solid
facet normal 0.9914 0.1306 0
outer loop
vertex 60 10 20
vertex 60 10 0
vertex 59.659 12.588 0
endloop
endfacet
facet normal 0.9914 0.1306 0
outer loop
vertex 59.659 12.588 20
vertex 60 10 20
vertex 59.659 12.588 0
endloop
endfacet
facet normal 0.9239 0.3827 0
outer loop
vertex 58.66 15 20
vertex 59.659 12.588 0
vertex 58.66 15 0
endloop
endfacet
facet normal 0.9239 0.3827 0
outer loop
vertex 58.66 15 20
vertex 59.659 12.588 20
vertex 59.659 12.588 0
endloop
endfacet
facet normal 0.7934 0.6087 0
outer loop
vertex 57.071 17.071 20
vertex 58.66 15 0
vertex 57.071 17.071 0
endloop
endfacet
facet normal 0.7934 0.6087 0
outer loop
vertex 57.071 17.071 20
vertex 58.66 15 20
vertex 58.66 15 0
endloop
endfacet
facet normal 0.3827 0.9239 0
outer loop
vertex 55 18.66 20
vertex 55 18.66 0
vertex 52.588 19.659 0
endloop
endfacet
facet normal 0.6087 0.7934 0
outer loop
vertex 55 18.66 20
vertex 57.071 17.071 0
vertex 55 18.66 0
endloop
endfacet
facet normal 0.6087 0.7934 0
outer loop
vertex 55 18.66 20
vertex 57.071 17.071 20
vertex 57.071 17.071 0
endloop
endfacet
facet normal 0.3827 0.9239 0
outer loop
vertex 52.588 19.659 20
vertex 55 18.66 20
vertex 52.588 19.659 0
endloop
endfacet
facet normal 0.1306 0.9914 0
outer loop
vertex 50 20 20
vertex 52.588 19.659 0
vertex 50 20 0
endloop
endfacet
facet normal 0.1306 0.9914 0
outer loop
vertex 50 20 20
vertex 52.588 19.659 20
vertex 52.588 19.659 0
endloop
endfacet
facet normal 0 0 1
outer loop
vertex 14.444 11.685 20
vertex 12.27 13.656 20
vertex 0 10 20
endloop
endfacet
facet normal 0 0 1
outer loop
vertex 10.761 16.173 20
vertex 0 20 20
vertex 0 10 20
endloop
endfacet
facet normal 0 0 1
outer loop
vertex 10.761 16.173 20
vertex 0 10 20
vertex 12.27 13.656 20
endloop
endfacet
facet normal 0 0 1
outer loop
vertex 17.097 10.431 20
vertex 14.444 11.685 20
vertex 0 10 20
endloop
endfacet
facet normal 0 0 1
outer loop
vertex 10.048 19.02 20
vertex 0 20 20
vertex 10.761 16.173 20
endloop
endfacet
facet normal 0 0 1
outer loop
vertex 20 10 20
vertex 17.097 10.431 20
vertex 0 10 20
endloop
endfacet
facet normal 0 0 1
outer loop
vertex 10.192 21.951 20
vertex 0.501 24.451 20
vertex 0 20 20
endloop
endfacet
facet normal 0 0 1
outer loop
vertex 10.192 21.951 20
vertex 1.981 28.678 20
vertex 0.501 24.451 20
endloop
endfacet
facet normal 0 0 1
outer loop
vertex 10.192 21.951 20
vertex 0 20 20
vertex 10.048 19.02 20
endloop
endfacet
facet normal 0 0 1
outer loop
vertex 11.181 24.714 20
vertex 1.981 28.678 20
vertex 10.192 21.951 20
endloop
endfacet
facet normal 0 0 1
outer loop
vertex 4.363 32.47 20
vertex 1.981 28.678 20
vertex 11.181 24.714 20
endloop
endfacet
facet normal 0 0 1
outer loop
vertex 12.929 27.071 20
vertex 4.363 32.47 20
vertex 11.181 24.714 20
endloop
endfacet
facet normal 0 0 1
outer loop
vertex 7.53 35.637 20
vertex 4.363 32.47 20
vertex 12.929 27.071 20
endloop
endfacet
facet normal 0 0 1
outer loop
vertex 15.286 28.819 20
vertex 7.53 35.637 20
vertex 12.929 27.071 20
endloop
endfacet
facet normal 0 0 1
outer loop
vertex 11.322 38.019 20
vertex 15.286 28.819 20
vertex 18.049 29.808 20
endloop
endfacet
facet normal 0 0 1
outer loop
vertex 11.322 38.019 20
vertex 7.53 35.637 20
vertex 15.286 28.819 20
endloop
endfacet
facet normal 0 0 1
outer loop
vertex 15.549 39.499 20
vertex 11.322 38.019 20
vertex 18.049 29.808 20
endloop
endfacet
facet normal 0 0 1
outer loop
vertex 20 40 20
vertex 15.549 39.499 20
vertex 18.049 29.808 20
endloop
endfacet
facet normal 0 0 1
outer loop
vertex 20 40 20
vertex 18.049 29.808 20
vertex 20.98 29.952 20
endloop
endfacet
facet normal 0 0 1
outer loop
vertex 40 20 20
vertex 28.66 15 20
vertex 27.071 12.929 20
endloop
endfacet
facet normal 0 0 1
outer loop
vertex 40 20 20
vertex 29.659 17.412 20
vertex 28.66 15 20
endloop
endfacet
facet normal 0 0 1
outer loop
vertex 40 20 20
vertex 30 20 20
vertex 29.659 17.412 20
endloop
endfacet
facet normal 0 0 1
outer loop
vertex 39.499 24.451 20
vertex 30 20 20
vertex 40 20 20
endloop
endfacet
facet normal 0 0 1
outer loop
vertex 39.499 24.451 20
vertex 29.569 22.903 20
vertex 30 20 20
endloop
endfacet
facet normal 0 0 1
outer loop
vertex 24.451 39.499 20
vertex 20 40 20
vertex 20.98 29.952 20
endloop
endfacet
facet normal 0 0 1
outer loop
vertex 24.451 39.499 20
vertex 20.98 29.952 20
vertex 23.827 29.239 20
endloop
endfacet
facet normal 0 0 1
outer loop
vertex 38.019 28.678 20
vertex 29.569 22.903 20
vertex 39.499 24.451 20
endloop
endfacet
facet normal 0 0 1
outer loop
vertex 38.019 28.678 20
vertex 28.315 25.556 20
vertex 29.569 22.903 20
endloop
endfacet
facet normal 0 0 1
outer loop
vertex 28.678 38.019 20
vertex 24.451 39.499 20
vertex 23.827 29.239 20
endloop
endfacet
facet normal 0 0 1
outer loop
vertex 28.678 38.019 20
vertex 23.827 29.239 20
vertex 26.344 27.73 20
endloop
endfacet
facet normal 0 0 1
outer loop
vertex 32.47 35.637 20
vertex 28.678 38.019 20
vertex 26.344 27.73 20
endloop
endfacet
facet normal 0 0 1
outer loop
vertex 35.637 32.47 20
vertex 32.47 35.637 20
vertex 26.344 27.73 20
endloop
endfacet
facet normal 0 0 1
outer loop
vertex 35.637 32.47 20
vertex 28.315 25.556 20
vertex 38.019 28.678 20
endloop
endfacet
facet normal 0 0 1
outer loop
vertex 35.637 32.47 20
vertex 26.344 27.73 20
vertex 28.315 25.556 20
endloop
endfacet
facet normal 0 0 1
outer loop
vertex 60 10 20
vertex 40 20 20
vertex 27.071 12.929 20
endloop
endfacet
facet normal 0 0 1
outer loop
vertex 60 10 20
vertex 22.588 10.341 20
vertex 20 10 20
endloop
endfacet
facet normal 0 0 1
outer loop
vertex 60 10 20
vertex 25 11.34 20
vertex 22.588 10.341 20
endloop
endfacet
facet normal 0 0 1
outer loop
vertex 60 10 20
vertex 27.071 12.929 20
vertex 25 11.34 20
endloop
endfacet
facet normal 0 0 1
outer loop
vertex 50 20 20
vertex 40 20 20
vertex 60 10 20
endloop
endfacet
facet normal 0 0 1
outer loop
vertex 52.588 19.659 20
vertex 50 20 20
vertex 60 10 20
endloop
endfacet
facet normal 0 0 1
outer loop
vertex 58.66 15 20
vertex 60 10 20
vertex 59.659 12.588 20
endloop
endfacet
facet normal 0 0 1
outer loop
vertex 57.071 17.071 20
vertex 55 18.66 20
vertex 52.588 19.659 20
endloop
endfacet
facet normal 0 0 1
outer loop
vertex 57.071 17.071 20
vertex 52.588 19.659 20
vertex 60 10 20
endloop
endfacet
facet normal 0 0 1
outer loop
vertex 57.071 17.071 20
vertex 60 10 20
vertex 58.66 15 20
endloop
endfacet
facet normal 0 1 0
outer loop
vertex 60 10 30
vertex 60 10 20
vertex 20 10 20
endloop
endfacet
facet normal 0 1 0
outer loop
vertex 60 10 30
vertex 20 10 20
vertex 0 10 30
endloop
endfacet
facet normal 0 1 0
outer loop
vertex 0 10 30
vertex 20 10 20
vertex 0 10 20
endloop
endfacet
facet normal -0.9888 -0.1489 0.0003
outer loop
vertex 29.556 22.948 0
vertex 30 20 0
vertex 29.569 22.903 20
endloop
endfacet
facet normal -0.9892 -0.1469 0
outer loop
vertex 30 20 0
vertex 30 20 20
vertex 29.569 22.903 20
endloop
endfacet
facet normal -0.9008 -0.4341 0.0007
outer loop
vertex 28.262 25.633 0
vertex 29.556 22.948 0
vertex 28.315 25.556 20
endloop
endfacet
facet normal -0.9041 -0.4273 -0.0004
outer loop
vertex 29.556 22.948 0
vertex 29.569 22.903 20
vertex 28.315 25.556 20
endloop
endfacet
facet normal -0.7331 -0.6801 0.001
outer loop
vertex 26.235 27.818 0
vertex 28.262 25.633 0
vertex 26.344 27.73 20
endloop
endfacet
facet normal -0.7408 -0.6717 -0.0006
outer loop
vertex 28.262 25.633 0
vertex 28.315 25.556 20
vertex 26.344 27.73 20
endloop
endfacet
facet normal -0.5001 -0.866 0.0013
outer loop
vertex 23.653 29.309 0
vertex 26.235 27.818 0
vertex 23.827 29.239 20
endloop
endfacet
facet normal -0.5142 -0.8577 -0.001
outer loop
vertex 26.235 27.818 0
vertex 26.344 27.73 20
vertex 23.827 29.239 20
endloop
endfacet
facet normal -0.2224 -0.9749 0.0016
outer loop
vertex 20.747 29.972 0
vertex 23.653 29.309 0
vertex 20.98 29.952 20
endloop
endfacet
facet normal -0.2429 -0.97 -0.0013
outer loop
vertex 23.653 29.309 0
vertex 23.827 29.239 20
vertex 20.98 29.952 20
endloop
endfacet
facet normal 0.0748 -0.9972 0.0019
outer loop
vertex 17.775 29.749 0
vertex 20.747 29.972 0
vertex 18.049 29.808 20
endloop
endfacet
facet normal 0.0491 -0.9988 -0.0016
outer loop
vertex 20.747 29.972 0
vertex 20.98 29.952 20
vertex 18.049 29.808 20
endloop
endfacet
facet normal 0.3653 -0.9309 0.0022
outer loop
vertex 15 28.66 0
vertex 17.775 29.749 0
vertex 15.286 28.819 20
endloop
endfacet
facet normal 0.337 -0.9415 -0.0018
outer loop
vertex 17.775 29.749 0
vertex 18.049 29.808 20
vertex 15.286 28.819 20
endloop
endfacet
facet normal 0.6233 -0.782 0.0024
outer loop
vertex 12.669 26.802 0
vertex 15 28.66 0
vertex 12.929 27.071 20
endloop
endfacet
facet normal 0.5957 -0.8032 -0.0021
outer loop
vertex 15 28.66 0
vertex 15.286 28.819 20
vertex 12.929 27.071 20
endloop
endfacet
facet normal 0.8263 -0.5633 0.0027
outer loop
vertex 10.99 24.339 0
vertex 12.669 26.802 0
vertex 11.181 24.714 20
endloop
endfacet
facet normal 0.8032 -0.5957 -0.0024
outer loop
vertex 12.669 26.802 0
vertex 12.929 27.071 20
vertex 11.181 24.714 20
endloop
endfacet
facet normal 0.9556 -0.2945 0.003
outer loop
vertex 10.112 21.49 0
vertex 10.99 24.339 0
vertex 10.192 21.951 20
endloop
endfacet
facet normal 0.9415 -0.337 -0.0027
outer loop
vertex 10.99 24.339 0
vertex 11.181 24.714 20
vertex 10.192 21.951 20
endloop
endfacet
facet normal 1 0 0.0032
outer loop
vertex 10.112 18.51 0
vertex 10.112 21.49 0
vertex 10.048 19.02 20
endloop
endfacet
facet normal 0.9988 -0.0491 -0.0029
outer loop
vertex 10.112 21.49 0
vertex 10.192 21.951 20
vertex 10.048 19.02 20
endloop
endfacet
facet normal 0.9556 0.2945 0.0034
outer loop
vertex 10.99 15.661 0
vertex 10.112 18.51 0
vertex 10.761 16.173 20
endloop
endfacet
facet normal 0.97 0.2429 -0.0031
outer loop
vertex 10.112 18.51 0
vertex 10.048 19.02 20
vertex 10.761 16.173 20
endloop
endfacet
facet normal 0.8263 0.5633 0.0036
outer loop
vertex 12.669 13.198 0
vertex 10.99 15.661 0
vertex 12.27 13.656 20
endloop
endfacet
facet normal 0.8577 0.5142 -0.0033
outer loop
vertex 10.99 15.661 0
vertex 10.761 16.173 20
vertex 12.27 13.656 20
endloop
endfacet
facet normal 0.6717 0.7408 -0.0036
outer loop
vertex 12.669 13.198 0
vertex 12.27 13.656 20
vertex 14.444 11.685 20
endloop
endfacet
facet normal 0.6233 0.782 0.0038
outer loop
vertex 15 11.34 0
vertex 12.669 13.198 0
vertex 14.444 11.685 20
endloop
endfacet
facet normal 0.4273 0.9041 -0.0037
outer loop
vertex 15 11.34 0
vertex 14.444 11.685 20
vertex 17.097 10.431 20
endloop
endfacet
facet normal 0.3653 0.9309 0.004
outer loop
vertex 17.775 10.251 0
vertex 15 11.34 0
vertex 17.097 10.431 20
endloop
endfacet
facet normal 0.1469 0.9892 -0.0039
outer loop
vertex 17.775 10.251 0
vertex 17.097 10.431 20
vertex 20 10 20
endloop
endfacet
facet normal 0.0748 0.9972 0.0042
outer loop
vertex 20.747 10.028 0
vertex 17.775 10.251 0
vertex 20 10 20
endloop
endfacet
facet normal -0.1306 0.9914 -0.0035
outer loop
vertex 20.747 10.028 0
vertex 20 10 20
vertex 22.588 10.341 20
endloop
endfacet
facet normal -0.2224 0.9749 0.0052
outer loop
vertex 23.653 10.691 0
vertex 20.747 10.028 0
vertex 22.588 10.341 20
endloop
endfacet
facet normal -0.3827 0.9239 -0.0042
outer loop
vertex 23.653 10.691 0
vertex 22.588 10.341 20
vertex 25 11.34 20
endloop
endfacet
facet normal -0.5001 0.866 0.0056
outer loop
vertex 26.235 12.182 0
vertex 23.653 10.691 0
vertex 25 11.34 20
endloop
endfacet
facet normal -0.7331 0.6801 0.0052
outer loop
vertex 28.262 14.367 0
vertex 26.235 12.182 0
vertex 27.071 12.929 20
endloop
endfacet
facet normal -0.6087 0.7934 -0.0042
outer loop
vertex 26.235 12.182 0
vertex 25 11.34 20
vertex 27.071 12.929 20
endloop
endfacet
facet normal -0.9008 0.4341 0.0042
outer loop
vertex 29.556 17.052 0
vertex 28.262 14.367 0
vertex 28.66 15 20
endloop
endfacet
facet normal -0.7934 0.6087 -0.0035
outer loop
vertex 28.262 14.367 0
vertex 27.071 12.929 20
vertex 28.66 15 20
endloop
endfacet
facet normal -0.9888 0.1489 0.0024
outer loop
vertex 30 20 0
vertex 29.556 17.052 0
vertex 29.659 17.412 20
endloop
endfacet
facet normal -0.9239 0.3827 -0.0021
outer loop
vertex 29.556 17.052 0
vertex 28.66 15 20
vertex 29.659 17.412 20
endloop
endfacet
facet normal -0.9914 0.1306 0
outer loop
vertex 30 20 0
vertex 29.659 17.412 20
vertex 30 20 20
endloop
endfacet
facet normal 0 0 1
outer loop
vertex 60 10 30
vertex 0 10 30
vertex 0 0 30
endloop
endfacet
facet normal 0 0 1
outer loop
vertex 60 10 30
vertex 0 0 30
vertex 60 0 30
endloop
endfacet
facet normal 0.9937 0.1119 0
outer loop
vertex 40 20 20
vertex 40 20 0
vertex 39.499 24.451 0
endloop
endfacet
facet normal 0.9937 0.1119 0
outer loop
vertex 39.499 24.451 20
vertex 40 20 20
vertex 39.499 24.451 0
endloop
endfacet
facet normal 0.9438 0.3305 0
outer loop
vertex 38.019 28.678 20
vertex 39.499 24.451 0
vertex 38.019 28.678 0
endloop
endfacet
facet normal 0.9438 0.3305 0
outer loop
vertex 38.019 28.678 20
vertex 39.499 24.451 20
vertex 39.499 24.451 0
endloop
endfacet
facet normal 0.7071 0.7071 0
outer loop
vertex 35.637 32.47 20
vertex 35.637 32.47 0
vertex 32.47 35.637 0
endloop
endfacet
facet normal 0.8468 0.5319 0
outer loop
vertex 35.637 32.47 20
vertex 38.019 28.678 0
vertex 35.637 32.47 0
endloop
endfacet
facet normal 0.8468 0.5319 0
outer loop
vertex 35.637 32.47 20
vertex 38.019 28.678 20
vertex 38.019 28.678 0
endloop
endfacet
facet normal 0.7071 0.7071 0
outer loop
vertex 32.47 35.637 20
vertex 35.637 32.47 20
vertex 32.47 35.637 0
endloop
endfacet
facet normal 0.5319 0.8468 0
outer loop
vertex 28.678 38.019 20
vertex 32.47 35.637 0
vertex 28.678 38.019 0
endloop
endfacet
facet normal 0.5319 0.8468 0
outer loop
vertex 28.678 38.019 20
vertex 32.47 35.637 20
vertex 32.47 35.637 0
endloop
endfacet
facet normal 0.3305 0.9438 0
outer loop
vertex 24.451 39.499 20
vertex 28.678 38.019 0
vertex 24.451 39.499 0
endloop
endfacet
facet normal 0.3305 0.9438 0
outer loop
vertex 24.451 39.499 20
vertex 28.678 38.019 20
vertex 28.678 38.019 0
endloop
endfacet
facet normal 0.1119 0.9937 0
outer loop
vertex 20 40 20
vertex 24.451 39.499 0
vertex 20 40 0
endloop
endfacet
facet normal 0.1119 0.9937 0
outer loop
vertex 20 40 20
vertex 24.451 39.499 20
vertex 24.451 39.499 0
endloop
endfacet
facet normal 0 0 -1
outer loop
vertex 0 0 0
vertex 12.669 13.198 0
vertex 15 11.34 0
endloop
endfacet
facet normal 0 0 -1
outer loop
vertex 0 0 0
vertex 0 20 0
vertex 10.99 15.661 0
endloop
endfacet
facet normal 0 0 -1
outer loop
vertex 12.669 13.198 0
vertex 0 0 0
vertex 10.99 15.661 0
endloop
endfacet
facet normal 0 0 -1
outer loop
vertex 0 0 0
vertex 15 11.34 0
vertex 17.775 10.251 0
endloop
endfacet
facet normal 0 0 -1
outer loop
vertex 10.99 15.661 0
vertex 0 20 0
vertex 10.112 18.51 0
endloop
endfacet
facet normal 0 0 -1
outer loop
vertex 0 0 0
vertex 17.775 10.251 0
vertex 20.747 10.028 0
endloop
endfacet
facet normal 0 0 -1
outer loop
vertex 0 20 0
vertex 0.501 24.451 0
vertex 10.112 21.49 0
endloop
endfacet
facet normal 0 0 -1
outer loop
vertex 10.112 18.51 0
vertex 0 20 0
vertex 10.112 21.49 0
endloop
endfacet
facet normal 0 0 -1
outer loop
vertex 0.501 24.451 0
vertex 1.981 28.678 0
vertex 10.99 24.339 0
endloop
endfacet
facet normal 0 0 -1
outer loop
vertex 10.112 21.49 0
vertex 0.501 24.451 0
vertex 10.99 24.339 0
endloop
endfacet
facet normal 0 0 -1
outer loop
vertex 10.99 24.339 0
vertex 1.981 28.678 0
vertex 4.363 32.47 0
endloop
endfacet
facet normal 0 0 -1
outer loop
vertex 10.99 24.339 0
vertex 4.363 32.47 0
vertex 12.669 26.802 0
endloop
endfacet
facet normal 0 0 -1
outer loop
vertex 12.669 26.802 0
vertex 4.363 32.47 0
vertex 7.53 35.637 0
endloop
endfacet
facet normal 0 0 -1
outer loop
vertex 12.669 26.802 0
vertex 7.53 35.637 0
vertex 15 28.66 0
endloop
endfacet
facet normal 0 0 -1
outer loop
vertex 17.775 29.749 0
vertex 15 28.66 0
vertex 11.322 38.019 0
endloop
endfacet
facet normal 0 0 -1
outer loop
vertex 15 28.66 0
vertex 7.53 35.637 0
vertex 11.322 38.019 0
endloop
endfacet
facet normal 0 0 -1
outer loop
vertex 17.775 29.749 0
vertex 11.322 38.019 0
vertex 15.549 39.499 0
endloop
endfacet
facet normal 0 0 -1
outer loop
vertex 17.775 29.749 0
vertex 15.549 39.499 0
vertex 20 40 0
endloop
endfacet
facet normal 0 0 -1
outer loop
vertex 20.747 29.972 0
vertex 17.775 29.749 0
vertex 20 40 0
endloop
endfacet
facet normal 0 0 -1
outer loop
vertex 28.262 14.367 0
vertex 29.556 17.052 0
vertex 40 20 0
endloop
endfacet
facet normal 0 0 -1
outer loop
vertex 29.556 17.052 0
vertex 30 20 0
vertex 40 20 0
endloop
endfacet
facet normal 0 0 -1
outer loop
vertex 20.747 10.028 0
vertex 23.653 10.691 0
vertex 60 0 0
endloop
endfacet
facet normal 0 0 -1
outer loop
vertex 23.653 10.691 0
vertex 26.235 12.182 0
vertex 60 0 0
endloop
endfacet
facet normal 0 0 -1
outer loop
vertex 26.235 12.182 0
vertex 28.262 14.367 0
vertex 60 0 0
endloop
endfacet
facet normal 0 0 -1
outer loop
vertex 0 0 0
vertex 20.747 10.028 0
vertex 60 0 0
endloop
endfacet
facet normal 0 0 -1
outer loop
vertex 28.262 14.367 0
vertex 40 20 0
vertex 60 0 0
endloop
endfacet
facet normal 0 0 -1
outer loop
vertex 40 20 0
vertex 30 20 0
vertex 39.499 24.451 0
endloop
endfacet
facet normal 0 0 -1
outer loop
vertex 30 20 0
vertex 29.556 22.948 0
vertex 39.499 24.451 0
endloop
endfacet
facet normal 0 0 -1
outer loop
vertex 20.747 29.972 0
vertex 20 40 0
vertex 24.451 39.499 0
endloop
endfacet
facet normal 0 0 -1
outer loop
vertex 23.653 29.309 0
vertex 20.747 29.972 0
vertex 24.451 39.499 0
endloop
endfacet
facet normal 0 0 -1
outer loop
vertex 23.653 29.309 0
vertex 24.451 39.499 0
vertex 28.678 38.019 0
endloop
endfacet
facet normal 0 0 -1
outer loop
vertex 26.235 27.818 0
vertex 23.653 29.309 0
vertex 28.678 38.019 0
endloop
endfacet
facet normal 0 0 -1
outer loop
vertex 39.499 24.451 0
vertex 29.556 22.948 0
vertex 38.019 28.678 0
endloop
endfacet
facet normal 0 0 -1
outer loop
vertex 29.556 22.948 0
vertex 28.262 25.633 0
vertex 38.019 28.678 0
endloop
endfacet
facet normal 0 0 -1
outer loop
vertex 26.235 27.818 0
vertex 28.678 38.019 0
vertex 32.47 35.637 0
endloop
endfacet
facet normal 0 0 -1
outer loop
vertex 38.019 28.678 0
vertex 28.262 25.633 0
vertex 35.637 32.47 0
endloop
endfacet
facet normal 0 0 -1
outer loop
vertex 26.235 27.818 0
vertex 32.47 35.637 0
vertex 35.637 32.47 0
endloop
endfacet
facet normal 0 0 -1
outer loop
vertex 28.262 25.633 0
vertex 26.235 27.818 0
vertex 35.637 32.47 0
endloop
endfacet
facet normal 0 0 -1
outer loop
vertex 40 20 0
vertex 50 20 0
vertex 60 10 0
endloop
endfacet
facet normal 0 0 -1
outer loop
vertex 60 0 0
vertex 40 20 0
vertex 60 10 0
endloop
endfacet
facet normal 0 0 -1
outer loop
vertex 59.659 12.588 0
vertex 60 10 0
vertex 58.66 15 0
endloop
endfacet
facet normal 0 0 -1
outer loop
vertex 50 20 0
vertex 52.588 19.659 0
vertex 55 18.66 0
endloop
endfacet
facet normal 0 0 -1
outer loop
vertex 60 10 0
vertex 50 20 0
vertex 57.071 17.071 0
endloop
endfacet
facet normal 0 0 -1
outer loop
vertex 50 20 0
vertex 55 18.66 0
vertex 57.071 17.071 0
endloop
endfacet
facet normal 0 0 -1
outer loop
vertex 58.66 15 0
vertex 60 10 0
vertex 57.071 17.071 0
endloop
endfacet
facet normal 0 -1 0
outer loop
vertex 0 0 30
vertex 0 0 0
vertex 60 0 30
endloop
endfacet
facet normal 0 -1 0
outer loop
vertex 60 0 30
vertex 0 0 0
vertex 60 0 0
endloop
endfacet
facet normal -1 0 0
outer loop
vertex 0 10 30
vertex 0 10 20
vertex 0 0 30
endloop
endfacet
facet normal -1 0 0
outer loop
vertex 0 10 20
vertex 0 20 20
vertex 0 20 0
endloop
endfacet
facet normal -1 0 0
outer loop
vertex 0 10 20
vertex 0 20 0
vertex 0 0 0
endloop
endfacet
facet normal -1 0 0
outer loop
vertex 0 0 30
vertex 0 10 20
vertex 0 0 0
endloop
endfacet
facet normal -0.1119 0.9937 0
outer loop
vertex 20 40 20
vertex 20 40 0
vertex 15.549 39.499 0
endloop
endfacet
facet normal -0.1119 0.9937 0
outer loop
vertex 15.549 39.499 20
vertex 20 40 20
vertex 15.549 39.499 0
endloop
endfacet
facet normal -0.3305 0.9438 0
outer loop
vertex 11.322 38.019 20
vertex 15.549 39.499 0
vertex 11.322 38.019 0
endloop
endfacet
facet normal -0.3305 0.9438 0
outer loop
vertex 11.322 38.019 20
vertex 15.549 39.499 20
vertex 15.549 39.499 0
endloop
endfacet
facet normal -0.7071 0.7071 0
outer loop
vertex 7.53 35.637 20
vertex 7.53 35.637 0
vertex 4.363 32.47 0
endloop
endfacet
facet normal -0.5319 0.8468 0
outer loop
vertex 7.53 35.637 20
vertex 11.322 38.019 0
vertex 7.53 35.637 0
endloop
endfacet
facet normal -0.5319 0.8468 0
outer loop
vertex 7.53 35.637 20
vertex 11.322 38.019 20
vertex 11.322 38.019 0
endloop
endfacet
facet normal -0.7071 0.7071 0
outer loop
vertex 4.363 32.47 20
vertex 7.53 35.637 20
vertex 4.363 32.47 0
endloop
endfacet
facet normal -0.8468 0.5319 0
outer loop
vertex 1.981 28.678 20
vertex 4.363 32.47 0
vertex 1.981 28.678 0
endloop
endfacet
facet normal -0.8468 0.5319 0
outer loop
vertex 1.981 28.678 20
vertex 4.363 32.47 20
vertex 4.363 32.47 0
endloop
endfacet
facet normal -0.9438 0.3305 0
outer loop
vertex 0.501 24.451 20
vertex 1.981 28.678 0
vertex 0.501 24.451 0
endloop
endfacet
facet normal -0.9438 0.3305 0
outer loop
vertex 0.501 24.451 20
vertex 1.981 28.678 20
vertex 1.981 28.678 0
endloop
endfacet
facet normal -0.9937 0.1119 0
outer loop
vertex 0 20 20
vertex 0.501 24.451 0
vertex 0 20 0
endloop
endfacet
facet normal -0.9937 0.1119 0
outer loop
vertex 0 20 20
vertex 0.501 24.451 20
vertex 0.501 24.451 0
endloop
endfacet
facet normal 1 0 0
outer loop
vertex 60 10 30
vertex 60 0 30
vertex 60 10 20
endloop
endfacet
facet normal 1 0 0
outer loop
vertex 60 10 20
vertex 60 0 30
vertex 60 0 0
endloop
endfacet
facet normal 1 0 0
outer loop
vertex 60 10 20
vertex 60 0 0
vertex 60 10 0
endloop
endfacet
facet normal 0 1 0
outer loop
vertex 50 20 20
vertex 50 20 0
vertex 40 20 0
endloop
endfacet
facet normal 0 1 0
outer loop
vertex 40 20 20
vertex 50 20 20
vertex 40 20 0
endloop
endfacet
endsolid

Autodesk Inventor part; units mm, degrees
ref_plane "YZ Plane" through (0, 0, 0) normal (1, 0, 0) x (0, 1, 0)
ref_plane "XZ Plane" through (0, 0, 0) normal (0, 1, 0) x (-1, 0, 0)
ref_plane "XY Plane" through (0, 0, 0) normal (0, 0, 1) x (1, 0, 0)
sketch "草圖1" plane through (0, 0, 0) normal (0, 0, 1) x (1, 0, 0)
  line L0 (0, 0) -> (60, 0)
  line L1 (60, 0) -> (60, 20)
  line L2 (60, 20) -> (0, 20)
  line L3 (0, 20) -> (0, 0)
  line L4 (0, 20) -> (40, 20)
  line L5 (40, 20) -> (40, 40)
  line L6 (40, 40) -> (0, 40)
  line L7 (0, 40) -> (0, 20)
  dimension "d0" = 20
  dimension "d1" = 20
  dimension "d2" = 60
  dimension "d3" = 40
extrude "擠出1" add sketch "草圖1" along normal blind 20
fillet "圓角1" radius 20 2 edges at (40, 40, 10) (0, 40, 10)
fillet "圓角2" radius 10 1 edges at (60, 20, 10)
sketch "草圖2" plane through (0, 0, 20) normal (0, 0, 1) x (1, 0, 0)
  line L0 (60, 0) -> (60, 10) projected
  line L1 (0, 20) -> (0, 0) projected
  line L2 (60, 10) -> (0, 10)
  line L3 (0, 10) -> (0, 0)
  line L4 (0, 0) -> (60, 0)
  line L5 (60, 0) -> (60, 10)
extrude "擠出2" add sketch "草圖2" along normal blind 10
sketch "草圖3" plane through (0, 0, 20) normal (0, 0, 1) x (1, 0, 0)
  arc A0 (40, 20) -> (0, 20) centre (20, 20) ccw projected
  circle A1 centre (20, 20) radius 10
  line L0 (0, 10) -> (60, 10) projected
  point P0 (0, 0)
extrude "擠出3" cut sketch "草圖3" against normal through all
properties part number "4"
